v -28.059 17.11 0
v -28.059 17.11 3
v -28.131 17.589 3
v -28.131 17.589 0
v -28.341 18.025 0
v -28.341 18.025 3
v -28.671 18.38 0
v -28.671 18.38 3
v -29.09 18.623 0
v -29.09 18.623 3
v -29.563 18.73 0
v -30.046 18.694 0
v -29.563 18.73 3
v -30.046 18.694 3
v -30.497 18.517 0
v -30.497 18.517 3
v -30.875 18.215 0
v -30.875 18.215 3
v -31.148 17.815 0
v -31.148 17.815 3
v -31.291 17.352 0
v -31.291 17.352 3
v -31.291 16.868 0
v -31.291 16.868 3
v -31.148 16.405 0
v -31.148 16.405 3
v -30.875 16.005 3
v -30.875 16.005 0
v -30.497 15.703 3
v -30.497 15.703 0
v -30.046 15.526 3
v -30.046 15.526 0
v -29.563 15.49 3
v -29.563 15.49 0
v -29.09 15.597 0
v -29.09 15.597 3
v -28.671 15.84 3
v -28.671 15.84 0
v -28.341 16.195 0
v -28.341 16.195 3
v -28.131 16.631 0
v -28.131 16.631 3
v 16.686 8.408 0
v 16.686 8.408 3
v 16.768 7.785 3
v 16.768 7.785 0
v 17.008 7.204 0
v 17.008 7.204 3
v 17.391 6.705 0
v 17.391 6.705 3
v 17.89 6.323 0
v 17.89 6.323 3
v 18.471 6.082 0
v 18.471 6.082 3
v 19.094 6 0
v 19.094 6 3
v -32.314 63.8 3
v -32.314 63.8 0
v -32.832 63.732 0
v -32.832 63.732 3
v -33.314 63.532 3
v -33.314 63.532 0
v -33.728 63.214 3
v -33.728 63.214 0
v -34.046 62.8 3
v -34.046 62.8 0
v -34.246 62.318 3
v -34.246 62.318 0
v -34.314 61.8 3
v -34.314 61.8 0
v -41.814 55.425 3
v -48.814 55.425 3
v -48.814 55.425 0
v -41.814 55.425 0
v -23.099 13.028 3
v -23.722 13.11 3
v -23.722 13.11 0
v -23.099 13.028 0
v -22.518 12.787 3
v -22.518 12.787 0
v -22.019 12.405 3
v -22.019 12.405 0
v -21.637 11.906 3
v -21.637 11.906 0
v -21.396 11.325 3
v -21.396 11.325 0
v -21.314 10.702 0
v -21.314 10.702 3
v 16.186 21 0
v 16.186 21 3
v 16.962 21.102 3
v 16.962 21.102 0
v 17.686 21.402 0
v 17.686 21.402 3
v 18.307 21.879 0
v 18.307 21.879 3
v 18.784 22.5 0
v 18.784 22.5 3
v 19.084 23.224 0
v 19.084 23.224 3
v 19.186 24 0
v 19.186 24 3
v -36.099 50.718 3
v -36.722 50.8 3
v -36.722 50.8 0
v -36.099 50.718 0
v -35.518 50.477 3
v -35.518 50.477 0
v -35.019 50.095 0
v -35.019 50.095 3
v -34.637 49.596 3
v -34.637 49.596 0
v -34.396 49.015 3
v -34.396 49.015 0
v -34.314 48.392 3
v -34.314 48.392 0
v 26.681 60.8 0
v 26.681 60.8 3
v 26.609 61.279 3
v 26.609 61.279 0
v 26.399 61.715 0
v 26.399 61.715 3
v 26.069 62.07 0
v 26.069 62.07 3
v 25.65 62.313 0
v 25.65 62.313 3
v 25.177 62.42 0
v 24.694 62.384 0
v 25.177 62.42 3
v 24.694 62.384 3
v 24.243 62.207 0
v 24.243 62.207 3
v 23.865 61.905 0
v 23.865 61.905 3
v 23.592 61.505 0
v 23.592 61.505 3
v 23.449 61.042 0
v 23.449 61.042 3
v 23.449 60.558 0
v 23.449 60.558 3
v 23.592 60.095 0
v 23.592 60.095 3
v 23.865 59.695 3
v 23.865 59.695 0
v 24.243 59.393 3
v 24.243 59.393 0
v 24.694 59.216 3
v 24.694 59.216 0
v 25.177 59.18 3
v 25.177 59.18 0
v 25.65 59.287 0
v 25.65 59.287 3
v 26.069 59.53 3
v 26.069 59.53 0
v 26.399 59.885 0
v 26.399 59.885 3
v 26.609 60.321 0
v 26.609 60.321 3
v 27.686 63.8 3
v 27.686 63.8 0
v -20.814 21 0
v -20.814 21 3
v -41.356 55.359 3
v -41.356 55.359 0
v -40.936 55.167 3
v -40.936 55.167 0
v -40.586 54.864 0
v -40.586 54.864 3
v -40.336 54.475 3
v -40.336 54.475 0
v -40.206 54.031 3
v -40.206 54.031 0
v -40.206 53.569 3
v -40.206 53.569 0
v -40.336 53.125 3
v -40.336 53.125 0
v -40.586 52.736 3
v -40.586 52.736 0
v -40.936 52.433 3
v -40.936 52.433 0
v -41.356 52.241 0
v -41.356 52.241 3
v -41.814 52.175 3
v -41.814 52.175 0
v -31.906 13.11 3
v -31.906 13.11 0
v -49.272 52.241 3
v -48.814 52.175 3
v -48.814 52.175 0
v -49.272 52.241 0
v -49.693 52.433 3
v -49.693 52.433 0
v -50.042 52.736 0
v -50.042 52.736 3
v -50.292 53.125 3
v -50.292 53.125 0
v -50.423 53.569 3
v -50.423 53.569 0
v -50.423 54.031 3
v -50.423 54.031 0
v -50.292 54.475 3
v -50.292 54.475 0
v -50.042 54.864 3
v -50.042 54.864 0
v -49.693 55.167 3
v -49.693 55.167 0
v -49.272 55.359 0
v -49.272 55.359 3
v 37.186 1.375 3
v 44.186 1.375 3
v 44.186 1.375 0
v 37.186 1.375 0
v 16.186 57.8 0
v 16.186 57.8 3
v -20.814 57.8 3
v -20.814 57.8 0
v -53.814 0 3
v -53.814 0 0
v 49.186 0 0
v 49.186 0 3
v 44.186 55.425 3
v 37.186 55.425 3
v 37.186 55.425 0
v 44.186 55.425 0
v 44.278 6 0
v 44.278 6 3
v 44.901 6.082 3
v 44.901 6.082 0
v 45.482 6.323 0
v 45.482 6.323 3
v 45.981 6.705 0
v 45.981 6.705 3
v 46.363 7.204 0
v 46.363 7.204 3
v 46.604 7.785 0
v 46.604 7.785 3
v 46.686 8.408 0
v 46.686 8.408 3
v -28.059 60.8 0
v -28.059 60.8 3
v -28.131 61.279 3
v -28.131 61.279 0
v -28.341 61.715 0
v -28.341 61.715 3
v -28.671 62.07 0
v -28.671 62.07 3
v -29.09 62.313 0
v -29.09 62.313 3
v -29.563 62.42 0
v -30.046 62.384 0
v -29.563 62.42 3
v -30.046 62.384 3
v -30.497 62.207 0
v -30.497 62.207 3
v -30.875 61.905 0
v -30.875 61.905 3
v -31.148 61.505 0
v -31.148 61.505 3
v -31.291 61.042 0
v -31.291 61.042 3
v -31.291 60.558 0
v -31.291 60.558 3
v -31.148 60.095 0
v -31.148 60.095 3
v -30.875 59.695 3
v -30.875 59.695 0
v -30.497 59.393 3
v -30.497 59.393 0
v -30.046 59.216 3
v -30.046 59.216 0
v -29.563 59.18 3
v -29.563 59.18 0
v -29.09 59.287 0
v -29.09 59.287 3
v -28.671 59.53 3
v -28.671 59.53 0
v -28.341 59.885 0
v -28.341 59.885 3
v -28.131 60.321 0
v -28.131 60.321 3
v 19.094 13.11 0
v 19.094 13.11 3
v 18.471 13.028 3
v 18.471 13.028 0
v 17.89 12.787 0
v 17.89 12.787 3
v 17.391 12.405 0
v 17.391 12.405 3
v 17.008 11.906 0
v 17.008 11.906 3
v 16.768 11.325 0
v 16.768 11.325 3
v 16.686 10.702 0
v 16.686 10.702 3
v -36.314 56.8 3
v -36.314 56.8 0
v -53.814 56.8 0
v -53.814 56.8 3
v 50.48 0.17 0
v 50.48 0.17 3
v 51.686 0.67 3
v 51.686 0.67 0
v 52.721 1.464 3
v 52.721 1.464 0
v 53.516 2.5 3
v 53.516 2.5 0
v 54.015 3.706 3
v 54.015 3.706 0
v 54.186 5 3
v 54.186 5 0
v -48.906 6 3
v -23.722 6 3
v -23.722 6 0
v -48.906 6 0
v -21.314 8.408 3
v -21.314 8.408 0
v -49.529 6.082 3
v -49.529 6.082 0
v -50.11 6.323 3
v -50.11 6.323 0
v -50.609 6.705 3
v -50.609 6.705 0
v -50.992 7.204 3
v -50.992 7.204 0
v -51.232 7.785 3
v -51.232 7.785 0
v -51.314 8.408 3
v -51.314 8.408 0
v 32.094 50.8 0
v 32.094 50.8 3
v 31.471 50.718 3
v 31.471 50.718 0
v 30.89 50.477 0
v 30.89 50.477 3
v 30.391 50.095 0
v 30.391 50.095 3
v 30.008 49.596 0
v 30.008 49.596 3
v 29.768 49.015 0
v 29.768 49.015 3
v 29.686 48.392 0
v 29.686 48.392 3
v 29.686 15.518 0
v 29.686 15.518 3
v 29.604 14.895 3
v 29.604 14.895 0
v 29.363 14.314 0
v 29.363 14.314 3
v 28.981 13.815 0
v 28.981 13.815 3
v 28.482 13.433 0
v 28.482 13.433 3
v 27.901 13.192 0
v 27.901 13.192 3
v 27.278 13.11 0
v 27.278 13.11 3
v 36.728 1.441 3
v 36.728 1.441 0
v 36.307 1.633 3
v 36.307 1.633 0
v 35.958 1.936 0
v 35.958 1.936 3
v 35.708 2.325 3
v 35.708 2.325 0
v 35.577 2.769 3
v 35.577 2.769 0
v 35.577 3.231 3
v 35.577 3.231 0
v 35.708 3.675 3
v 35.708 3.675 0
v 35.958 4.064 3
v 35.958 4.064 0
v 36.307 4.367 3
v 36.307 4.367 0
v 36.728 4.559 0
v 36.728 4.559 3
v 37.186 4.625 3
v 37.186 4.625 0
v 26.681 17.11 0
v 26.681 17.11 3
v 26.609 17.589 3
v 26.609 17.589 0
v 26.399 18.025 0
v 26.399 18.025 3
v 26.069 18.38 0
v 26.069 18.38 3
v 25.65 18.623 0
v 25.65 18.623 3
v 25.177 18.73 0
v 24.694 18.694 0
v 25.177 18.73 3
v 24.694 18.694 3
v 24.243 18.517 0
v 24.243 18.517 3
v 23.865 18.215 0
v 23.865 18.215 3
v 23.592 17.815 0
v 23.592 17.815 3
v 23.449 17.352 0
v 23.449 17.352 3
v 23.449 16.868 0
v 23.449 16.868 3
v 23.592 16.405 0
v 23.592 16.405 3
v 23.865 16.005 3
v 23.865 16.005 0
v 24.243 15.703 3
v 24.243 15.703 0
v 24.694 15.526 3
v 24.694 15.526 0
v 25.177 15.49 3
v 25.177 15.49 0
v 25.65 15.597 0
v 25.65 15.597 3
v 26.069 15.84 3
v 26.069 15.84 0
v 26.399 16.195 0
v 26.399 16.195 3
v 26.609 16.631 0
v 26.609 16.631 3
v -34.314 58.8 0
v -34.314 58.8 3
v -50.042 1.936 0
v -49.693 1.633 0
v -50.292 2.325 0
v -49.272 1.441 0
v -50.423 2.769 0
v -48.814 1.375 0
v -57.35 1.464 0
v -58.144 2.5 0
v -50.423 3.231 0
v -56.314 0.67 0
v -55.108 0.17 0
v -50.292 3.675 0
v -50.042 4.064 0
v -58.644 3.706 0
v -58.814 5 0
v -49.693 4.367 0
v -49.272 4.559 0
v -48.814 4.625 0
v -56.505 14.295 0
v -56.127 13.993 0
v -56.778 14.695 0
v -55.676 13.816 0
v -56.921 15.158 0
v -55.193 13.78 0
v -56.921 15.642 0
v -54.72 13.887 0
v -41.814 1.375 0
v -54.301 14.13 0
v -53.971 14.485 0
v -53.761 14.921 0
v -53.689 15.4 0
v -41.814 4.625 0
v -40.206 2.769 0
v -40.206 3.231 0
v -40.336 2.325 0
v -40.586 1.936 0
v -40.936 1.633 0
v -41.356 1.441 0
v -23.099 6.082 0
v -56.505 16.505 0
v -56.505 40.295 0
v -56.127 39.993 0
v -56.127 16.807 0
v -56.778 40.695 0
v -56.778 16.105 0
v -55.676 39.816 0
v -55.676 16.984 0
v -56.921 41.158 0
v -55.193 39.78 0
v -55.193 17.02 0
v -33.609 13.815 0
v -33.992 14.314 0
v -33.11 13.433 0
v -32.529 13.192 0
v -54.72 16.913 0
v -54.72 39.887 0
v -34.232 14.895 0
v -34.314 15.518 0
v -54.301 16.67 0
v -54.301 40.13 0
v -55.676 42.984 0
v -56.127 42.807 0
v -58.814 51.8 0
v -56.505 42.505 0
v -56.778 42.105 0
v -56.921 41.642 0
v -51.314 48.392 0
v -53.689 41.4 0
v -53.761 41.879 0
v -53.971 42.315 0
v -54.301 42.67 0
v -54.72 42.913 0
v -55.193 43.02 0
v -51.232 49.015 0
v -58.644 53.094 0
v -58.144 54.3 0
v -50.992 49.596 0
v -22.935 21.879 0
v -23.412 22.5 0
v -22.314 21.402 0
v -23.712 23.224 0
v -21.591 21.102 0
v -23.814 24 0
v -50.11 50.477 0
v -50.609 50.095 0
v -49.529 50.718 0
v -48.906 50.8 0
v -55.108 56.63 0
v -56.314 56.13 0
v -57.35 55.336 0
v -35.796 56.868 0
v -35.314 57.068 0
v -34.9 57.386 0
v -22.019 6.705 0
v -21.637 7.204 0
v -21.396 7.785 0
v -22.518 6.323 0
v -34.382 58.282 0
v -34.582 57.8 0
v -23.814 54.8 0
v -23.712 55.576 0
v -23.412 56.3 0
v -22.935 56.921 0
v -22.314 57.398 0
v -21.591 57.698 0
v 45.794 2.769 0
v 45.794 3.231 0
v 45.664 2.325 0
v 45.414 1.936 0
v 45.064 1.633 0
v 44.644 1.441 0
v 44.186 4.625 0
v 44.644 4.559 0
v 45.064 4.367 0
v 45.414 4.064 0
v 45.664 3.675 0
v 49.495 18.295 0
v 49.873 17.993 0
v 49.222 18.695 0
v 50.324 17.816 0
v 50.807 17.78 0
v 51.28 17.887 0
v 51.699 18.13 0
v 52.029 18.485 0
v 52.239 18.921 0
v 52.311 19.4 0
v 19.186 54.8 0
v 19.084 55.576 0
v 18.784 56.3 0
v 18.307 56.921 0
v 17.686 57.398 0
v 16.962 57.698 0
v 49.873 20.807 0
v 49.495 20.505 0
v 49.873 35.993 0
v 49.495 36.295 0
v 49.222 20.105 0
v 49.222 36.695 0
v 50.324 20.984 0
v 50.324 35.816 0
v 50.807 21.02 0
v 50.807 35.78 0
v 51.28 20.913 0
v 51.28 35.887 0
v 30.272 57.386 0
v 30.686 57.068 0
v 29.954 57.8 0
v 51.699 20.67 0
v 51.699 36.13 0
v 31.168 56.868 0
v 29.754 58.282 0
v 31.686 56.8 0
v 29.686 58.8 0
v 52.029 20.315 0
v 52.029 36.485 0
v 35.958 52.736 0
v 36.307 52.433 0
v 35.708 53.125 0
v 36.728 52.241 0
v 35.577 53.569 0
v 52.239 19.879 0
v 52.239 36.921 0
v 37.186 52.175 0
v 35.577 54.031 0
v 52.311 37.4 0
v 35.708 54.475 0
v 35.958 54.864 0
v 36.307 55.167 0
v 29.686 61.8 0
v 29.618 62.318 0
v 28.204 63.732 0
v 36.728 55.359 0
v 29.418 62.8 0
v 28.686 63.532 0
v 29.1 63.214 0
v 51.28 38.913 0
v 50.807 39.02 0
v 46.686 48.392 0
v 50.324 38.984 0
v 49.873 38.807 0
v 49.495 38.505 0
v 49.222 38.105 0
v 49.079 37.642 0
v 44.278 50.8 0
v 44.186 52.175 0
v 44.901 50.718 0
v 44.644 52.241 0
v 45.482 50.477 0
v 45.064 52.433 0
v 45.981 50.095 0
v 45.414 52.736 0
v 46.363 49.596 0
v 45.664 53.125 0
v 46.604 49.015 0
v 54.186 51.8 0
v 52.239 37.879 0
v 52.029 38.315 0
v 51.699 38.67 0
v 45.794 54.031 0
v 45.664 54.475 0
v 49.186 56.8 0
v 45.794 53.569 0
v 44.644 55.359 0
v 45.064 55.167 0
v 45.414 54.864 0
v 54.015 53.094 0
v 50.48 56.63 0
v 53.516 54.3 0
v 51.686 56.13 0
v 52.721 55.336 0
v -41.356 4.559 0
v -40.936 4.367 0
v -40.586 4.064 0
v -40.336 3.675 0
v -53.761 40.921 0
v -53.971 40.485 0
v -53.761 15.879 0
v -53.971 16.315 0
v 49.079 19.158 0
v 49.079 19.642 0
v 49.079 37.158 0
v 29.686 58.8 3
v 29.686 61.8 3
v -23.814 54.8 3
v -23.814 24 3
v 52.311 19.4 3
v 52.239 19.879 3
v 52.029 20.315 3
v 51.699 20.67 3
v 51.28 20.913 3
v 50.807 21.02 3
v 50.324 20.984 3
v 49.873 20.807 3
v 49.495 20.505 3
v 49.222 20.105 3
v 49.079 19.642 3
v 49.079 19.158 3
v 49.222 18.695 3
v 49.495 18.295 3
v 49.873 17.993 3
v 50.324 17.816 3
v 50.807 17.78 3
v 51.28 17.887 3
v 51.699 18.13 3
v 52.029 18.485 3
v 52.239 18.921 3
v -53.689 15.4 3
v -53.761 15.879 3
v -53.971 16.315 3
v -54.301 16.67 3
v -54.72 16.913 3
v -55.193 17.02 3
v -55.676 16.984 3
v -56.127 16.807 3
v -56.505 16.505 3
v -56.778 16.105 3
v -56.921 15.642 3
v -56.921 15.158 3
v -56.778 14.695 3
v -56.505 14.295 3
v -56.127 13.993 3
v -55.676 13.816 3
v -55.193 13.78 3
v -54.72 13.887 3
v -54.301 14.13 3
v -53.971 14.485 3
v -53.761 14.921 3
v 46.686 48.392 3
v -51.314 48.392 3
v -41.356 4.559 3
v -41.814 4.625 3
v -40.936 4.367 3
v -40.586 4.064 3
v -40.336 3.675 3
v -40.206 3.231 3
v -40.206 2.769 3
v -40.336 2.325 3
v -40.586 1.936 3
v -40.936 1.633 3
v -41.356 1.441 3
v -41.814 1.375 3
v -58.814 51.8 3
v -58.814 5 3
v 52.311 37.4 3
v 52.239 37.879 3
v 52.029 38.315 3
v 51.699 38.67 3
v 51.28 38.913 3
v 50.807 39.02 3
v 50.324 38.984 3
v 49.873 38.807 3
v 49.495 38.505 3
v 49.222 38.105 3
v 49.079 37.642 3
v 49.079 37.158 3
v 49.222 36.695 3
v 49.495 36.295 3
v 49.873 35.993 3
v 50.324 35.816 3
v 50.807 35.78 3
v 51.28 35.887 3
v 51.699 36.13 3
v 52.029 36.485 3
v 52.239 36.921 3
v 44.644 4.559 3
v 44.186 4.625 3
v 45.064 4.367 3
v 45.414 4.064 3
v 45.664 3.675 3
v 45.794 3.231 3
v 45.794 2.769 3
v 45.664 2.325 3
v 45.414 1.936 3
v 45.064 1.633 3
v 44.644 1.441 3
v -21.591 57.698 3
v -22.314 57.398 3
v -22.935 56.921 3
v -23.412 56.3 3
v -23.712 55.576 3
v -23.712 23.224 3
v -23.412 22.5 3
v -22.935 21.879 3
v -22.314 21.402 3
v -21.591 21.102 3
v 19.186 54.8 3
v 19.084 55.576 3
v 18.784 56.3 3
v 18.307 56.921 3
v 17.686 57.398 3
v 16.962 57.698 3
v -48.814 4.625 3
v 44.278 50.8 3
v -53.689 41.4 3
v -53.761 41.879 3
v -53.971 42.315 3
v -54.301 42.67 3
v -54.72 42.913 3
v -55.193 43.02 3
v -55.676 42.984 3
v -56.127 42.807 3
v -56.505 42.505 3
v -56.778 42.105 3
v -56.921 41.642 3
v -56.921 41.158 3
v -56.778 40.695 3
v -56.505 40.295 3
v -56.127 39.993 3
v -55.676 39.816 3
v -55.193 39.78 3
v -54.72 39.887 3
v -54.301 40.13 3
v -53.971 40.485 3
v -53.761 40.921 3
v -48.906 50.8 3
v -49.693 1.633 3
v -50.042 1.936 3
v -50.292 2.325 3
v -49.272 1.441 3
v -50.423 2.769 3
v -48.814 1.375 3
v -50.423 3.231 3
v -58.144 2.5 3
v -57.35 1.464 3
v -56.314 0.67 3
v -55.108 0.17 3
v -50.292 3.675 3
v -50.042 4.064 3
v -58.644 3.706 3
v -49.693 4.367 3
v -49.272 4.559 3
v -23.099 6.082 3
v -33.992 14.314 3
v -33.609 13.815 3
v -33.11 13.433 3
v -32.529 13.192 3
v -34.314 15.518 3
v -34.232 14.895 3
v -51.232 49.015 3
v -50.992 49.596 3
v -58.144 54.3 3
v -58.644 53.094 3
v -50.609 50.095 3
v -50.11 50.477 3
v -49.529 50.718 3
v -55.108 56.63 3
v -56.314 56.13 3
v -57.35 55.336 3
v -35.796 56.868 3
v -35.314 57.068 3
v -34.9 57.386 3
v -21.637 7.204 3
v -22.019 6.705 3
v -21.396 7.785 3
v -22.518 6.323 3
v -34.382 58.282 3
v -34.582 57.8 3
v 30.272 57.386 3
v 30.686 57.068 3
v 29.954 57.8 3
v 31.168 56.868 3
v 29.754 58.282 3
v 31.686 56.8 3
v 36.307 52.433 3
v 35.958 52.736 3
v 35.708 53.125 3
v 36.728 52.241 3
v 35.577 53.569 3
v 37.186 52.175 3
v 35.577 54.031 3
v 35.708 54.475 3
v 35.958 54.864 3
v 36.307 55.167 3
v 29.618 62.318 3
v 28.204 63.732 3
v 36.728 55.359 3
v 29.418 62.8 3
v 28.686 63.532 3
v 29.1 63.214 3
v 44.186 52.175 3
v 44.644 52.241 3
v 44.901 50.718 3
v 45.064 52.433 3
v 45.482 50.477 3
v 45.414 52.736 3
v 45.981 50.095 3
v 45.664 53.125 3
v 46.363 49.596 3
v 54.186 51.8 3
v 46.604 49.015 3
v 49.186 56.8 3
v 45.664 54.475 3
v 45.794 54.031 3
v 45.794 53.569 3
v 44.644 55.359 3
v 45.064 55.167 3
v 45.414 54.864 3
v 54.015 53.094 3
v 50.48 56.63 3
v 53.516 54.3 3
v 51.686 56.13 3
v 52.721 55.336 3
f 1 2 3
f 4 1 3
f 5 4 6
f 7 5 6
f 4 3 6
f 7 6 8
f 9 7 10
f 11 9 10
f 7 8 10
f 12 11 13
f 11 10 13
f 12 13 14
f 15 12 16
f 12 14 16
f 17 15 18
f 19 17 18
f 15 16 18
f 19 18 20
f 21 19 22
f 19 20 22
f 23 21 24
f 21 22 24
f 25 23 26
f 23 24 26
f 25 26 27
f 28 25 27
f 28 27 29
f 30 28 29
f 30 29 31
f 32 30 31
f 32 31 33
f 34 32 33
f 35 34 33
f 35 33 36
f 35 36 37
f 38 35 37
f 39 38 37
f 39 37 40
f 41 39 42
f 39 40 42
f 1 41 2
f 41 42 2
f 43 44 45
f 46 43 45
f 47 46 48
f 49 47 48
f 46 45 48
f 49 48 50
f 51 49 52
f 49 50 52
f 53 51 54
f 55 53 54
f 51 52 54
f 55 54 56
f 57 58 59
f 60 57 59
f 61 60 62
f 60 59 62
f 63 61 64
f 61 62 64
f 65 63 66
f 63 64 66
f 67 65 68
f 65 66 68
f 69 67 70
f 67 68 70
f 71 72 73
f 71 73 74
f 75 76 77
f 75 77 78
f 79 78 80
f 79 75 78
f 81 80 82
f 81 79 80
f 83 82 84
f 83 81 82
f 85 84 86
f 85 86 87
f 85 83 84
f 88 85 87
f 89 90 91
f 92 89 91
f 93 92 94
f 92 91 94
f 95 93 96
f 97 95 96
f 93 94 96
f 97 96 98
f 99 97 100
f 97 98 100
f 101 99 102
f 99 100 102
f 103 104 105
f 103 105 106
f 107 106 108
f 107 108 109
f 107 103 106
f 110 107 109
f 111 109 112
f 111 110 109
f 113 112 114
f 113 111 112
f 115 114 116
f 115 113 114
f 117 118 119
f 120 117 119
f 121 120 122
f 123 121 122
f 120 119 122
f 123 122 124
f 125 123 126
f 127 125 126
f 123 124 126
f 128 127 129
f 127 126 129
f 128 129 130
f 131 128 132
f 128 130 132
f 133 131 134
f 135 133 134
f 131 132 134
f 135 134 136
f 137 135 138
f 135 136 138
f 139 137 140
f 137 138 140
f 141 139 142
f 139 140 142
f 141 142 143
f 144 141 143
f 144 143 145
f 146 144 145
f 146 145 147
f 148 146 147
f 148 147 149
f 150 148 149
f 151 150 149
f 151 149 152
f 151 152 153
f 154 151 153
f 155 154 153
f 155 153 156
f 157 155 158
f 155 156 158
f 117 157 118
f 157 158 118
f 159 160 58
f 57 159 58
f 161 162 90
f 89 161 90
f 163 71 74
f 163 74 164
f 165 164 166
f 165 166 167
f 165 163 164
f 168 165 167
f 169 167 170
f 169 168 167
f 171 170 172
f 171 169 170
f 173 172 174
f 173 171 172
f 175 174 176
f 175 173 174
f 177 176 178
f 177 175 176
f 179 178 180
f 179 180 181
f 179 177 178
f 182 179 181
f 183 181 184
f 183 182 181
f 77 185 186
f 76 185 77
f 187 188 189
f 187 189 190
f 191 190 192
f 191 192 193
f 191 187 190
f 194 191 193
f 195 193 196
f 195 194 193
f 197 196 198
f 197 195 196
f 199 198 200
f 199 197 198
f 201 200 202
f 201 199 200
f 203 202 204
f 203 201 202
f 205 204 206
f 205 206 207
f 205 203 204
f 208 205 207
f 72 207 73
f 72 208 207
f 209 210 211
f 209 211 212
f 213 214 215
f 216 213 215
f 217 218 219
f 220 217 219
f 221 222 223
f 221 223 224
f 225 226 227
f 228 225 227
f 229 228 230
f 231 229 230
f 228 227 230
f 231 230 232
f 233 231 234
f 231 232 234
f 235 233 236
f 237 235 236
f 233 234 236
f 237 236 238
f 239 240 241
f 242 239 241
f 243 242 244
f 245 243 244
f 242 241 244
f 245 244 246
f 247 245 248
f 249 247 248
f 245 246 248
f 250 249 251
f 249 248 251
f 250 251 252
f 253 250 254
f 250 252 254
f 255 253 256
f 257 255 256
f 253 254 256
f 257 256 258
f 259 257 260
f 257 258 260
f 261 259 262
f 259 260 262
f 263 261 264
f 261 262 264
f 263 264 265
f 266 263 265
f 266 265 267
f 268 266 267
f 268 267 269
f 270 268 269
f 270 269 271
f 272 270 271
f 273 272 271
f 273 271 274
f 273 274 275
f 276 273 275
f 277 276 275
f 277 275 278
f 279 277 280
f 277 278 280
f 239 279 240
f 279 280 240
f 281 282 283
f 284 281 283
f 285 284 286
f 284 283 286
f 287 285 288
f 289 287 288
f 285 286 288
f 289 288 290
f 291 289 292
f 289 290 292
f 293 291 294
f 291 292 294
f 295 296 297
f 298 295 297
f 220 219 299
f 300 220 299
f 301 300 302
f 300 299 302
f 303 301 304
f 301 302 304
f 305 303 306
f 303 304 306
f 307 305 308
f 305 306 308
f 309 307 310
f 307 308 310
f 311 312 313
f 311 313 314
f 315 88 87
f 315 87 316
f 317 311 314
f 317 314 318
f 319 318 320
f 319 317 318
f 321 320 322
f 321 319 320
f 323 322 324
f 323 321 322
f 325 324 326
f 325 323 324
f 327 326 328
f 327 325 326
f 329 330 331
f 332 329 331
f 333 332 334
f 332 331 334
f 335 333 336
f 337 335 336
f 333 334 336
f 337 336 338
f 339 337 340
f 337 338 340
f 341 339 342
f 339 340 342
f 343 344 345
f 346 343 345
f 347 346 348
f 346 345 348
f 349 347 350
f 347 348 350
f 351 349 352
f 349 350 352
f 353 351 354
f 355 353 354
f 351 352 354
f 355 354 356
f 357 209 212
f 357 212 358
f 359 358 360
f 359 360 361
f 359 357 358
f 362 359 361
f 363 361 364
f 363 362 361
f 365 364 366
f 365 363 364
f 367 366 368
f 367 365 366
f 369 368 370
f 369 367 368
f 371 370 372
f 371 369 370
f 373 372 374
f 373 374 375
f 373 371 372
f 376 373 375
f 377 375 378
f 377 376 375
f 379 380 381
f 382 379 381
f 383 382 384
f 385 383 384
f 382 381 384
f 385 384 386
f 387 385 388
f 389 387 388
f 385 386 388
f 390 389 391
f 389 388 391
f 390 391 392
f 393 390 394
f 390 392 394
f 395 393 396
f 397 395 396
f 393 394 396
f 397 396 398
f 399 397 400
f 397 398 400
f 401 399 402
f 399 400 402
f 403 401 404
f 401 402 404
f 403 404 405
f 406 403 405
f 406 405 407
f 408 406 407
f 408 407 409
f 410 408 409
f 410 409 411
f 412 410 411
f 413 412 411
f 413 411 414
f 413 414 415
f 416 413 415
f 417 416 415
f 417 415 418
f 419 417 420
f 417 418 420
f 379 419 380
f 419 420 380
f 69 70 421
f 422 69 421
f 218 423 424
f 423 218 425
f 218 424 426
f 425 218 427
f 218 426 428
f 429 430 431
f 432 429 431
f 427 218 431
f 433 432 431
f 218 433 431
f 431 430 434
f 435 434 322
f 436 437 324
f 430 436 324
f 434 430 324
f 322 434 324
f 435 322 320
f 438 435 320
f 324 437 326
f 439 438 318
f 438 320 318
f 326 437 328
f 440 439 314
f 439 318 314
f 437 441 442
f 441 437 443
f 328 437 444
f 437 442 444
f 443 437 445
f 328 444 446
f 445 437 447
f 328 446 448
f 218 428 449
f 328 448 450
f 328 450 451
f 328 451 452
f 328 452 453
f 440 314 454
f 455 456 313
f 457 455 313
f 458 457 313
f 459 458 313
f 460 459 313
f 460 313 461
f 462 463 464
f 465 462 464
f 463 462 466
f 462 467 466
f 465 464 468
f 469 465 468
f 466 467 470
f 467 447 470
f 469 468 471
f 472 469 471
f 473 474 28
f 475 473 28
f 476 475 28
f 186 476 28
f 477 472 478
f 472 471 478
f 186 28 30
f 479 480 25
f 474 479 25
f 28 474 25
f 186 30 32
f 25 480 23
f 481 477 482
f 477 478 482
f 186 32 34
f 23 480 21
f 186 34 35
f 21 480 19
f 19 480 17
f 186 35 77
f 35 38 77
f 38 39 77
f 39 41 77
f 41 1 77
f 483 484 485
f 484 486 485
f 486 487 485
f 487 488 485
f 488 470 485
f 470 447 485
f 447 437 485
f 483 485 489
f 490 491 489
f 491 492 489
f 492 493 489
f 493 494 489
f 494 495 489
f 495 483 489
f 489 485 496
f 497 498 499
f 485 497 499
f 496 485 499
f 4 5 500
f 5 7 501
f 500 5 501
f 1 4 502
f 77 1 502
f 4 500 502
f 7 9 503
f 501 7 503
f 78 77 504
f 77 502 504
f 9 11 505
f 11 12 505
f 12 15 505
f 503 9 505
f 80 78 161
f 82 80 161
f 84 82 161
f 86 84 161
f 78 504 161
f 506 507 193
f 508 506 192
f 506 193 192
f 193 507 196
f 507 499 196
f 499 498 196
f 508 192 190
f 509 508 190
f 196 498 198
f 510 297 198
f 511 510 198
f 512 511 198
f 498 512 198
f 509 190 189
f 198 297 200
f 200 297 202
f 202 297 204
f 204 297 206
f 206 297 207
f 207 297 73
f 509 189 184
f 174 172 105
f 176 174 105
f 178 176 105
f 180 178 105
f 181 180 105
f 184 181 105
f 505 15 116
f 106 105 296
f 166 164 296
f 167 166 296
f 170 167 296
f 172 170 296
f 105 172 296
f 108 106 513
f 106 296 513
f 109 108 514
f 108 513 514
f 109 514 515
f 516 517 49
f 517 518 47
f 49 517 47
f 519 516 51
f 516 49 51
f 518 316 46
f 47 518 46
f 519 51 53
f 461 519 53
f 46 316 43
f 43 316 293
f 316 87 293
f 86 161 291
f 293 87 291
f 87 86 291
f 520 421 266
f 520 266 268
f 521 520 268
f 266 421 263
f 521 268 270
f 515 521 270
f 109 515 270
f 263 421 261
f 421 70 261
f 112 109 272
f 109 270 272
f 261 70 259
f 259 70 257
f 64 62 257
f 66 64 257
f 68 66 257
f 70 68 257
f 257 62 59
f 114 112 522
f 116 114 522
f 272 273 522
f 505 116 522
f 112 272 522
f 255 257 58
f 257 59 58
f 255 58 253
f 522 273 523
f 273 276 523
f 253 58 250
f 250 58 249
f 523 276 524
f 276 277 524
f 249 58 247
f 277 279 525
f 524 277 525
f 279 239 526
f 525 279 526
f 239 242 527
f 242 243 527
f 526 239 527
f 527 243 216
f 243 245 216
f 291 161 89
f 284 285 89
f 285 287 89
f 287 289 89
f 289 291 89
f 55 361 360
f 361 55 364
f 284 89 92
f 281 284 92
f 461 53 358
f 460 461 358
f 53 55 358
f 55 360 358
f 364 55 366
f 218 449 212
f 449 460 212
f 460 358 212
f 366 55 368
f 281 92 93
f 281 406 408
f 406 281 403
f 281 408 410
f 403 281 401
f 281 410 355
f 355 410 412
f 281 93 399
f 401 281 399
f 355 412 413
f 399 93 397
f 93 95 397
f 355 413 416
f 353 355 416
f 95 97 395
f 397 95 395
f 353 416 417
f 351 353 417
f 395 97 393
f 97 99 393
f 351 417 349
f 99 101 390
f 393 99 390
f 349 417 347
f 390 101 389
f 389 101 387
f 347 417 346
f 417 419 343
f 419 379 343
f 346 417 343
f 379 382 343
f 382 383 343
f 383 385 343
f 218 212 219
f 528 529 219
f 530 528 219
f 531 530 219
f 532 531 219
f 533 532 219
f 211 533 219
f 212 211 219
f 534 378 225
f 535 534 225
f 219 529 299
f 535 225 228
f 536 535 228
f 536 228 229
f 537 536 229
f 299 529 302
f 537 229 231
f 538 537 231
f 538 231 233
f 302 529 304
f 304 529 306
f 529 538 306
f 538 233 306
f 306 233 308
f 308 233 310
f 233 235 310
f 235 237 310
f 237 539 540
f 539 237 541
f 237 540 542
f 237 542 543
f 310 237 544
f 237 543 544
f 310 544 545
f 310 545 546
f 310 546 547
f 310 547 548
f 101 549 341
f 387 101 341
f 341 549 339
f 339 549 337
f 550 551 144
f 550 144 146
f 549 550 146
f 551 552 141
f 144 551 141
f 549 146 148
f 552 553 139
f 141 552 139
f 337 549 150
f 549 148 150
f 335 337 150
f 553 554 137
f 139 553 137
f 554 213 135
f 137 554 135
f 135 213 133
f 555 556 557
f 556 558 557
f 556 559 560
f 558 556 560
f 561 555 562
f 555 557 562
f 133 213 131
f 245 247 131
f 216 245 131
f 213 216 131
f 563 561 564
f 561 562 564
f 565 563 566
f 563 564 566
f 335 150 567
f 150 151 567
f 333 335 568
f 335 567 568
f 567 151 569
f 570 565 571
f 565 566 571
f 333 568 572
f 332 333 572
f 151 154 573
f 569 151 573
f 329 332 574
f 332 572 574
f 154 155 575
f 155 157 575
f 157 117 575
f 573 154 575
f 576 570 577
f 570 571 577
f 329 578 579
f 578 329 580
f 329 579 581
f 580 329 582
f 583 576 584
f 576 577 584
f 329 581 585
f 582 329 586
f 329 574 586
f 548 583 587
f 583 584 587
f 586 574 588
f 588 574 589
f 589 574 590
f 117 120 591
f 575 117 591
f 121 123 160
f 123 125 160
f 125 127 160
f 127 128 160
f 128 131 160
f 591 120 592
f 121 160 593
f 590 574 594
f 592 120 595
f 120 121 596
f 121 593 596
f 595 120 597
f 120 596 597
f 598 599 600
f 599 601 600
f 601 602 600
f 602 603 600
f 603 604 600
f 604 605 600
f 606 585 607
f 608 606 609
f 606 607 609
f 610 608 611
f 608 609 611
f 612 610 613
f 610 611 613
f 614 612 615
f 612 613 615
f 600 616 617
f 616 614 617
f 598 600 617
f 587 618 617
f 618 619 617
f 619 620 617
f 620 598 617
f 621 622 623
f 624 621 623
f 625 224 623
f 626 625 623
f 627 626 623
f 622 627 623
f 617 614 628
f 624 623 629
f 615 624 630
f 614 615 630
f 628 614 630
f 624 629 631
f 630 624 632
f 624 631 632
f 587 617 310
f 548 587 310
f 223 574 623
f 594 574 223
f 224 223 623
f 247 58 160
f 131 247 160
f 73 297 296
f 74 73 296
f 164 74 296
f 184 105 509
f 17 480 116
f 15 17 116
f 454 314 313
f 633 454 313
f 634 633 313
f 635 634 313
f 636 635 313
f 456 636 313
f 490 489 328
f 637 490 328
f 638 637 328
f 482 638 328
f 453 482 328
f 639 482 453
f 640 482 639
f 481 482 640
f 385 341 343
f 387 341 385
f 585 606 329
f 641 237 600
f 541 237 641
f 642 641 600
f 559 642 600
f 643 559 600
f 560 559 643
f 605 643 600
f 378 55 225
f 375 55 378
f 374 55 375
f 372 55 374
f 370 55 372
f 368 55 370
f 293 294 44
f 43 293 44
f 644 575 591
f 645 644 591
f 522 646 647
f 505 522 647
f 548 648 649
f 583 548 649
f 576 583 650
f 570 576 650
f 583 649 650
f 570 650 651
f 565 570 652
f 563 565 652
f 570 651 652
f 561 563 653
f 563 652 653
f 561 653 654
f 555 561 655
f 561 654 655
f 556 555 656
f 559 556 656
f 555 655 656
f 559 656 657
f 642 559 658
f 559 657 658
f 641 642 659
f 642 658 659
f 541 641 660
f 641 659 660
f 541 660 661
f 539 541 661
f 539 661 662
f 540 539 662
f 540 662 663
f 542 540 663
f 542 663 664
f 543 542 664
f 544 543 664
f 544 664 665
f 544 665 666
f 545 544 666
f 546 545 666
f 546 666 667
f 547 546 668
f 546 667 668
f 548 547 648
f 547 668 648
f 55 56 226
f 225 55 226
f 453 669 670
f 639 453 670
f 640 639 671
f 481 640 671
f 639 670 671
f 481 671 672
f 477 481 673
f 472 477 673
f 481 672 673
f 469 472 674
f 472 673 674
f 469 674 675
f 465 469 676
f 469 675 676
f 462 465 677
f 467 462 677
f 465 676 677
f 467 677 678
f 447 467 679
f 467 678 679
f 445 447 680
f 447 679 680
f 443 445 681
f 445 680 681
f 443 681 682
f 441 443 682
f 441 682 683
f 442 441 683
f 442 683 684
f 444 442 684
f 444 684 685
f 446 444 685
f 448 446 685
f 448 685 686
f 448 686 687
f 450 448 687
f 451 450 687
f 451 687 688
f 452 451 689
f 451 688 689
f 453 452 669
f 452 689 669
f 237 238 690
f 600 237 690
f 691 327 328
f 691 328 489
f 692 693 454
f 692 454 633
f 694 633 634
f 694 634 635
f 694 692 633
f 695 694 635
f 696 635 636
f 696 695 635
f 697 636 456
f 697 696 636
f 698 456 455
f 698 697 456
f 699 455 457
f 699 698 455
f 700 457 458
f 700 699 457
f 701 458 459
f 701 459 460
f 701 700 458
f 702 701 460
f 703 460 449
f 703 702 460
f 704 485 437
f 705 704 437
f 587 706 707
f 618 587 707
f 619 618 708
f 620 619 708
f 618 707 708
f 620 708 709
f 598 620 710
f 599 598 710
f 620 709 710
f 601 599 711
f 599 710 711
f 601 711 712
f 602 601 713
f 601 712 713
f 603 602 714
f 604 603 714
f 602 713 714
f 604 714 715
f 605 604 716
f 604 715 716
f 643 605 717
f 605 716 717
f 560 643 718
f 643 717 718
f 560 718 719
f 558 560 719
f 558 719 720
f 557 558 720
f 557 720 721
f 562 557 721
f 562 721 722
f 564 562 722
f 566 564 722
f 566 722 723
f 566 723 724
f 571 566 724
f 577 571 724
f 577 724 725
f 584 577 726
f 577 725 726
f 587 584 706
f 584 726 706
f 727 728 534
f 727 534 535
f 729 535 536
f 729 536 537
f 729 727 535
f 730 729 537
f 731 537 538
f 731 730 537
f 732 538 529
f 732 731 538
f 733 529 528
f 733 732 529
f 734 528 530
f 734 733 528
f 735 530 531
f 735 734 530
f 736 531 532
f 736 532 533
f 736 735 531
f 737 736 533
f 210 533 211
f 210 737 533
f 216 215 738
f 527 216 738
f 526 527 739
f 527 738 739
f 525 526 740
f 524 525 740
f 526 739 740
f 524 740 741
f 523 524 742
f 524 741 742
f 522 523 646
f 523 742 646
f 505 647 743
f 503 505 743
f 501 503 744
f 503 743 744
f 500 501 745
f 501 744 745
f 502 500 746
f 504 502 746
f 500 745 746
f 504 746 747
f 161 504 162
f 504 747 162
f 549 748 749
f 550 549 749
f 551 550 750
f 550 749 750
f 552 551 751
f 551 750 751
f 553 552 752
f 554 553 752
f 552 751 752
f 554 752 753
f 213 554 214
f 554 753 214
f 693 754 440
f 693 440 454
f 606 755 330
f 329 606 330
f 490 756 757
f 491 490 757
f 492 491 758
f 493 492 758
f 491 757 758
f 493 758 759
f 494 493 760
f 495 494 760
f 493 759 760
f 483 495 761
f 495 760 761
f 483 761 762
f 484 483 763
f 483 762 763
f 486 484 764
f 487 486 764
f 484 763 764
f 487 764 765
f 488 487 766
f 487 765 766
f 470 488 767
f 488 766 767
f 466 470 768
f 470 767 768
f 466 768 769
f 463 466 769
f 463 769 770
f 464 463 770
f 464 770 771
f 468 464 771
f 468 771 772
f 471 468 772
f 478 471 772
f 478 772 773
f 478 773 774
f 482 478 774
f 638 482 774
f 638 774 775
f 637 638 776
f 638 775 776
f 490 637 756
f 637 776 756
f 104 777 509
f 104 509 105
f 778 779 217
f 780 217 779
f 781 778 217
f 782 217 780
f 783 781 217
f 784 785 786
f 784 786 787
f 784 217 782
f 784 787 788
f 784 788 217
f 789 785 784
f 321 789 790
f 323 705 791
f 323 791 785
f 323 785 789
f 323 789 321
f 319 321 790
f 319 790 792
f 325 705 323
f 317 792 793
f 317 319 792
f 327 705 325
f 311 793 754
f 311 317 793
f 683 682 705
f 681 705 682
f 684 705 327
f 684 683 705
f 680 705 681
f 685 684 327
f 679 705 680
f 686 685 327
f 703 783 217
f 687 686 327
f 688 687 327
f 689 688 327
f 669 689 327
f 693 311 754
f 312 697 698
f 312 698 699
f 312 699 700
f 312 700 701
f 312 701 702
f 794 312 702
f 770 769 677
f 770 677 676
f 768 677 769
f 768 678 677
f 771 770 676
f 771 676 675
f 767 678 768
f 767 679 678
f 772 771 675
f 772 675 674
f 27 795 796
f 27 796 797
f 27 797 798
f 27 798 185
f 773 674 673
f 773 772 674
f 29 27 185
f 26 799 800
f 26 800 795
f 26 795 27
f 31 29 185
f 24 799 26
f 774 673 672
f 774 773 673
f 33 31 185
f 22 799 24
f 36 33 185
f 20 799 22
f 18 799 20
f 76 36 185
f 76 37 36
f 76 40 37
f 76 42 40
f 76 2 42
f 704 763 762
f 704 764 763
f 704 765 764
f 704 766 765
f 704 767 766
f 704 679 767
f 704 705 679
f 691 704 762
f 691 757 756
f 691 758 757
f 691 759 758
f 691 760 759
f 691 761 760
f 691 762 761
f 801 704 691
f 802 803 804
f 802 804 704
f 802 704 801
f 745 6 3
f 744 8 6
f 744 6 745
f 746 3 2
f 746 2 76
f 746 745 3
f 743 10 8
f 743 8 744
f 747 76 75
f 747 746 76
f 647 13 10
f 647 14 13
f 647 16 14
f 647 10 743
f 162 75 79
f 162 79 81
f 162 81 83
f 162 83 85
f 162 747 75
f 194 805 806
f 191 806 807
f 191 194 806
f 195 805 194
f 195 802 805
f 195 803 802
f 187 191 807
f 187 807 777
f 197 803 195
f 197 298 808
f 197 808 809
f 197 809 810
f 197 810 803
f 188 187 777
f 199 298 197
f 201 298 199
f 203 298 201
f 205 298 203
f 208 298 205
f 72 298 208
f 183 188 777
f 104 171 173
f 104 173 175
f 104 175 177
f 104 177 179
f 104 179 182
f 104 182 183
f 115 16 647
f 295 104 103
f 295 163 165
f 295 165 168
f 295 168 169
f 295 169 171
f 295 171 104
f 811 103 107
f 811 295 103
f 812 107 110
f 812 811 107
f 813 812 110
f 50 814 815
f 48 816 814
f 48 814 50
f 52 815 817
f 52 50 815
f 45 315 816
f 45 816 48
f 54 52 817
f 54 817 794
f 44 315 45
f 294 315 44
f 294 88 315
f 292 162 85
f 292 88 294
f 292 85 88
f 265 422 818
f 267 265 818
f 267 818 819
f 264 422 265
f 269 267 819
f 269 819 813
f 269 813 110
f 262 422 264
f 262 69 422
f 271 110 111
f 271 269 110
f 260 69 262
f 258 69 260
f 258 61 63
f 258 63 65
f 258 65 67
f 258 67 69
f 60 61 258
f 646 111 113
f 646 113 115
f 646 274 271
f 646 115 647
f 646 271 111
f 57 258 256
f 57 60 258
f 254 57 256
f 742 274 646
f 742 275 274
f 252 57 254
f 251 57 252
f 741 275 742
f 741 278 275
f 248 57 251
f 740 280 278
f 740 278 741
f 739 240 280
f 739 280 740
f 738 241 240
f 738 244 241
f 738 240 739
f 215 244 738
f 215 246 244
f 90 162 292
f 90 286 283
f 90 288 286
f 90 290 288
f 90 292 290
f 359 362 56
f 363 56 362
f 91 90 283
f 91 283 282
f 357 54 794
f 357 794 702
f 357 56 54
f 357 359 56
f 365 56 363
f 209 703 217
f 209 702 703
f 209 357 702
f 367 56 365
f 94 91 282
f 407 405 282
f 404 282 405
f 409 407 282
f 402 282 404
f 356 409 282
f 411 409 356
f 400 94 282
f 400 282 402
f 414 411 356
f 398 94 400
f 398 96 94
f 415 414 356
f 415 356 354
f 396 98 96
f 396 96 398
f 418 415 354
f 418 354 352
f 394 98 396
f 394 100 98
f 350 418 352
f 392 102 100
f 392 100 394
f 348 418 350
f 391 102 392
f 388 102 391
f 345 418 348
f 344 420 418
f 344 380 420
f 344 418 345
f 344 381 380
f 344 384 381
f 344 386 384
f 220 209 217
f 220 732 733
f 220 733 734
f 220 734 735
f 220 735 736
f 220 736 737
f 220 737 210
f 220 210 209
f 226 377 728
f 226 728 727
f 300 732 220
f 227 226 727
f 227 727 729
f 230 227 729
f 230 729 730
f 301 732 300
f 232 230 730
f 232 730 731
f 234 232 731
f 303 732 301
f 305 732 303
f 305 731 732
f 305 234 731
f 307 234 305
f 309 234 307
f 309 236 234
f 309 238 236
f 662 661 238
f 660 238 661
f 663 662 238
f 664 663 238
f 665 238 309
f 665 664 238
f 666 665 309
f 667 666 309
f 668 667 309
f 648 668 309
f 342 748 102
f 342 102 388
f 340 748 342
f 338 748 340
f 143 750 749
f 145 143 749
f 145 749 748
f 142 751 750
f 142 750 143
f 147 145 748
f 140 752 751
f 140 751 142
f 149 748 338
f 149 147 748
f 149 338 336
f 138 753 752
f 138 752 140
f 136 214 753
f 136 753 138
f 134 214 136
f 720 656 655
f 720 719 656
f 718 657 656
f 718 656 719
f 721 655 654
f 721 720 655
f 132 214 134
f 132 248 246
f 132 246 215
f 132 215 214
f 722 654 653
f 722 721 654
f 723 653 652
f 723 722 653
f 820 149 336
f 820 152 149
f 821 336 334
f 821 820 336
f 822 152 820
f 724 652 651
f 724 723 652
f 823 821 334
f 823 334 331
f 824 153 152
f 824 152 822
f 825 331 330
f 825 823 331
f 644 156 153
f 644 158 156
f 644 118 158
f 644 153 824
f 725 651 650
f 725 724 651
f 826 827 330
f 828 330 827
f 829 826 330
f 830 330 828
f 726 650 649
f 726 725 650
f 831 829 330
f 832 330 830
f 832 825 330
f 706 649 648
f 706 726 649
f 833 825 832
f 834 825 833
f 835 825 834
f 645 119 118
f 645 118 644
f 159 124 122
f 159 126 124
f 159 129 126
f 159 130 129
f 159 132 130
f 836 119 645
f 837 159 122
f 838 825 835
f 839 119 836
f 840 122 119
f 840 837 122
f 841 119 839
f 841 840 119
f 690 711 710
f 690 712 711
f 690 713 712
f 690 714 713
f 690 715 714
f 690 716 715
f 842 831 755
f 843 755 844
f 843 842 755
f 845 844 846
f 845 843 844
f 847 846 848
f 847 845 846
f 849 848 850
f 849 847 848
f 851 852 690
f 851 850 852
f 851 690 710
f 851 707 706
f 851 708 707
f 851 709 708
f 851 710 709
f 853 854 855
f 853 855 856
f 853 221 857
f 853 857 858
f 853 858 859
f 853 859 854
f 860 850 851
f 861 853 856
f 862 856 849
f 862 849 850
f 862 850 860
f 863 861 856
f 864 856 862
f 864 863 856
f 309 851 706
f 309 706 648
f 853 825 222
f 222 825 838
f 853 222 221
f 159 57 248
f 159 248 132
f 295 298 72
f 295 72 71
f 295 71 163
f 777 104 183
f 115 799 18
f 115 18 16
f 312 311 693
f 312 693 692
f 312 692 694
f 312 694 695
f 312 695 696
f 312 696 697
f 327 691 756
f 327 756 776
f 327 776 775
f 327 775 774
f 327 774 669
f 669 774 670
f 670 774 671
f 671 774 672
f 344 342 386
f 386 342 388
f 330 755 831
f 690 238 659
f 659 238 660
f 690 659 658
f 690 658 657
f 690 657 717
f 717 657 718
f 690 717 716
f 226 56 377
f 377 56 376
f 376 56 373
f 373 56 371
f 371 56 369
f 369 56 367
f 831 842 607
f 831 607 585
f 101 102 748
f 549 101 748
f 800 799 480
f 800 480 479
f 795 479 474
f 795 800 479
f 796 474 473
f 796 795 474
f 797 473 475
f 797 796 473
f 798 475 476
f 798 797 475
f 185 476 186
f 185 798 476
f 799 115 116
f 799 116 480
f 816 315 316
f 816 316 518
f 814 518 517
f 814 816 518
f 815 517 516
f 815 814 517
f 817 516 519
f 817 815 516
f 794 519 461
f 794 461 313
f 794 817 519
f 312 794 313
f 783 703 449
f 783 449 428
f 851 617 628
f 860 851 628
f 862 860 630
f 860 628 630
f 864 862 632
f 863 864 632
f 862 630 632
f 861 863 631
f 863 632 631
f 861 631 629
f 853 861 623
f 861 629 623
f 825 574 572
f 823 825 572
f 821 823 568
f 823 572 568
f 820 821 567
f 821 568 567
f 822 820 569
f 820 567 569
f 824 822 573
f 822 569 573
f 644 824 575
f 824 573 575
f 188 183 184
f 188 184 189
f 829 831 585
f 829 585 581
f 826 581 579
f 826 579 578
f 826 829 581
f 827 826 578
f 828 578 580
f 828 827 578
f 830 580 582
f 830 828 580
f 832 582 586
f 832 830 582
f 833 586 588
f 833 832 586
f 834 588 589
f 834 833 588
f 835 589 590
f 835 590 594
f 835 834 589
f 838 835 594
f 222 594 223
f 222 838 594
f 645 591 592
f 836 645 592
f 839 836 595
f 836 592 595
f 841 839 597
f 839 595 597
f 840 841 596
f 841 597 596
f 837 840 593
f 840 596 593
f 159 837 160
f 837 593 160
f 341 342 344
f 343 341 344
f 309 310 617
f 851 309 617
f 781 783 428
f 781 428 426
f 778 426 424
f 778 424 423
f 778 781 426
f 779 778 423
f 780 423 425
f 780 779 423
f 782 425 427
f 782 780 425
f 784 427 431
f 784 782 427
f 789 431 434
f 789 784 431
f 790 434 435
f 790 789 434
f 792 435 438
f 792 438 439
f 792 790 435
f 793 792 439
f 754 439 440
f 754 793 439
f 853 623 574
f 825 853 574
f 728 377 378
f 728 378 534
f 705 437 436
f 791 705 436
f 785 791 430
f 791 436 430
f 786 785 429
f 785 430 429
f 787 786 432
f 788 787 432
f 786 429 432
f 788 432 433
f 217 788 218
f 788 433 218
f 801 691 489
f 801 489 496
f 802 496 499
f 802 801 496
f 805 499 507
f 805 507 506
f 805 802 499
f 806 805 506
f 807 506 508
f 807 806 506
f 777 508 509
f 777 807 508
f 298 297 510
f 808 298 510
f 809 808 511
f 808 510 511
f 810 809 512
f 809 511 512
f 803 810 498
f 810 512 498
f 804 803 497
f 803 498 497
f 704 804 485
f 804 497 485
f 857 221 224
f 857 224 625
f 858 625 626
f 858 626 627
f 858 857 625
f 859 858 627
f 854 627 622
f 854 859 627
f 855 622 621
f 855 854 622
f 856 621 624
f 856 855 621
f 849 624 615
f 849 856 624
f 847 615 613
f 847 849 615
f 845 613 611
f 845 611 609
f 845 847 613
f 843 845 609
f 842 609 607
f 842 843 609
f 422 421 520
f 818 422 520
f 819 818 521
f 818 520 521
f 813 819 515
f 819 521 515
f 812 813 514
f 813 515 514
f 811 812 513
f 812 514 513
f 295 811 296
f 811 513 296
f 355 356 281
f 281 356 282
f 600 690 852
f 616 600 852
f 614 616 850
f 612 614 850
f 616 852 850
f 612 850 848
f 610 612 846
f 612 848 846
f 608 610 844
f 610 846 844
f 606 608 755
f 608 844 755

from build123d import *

# Parameters (mm, degrees)
EXTRUDE_2_DEPTH     = 3
SKETCH_5_R          = 1.625
CUT_EXTRUDE_3_DEPTH = 3


with BuildPart() as part:
    # 草图1 → 凸台-拉伸2 (new body)
    with BuildSketch(Plane.XY):
        with BuildLine():
            Line((-53.814137931, 0), (49.185862069, 0))
            ThreePointArc((49.185862069, 0), (52.721395975, 1.464466094), (54.185862069, 5))
            Line((54.185862069, 5), (54.185862069, 51.8))
            ThreePointArc((54.185862069, 51.8), (52.721395975, 55.335533906), (49.185862069, 56.8))
            Line((49.185862069, 56.8), (31.685862069, 56.8))
            ThreePointArc((31.685862069, 56.8), (30.271648507, 57.385786438), (29.685862069, 58.8))
            Line((29.685862069, 58.8), (29.685862069, 61.8))
            ThreePointArc((29.685862069, 61.8), (29.100075631, 63.214213562), (27.685862069, 63.8))
            Line((27.685862069, 63.8), (-32.314137931, 63.8))
            ThreePointArc((-32.314137931, 63.8), (-33.728351493, 63.214213562), (-34.314137931, 61.8))
            Line((-34.314137931, 61.8), (-34.314137931, 58.8))
            ThreePointArc((-34.314137931, 58.8), (-34.899924369, 57.385786438), (-36.314137931, 56.8))
            Line((-36.314137931, 56.8), (-53.814137931, 56.8))
            ThreePointArc((-53.814137931, 56.8), (-57.349671837, 55.335533906), (-58.814137931, 51.8))
            Line((-58.814137931, 51.8), (-58.814137931, 5))
            ThreePointArc((-58.814137931, 5), (-57.349671837, 1.464466094), (-53.814137931, 0))
        make_face()
    extrude(amount=EXTRUDE_2_DEPTH)

    # 草图5 → 切除-拉伸3 (cut)
    with BuildSketch(Plane.XY.offset(3)):
        with Locations((-29.684137931, 60.8)):
            Circle(SKETCH_5_R)
        with Locations((25.055862069, 60.8)):
            Circle(SKETCH_5_R)
        with Locations((-29.684137931, 17.11)):
            Circle(SKETCH_5_R)
        with Locations((25.055862069, 17.11)):
            Circle(SKETCH_5_R)
        with Locations((-55.314137931, 15.4)):
            Circle(SKETCH_5_R)
        with Locations((-55.314137931, 41.4)):
            Circle(SKETCH_5_R)
        with Locations((50.685862069, 37.4)):
            Circle(SKETCH_5_R)
        with Locations((50.685862069, 19.4)):
            Circle(SKETCH_5_R)
        with BuildLine():
            Line((-48.906226665, 50.8), (-36.722049198, 50.8))
            ThreePointArc((-36.722049198, 50.8), (-35.019398812, 50.094739119), (-34.314137931, 48.392088734))
            Line((-34.314137931, 48.392088734), (-34.314137931, 15.517911266))
            ThreePointArc((-34.314137931, 15.517911266), (-33.60887705, 13.815260881), (-31.906226665, 13.11))
            Line((-31.906226665, 13.11), (-23.722049198, 13.11))
            ThreePointArc((-23.722049198, 13.11), (-22.019398812, 12.404739119), (-21.314137931, 10.702088734))
            Line((-21.314137931, 10.702088734), (-21.314137931, 8.407911266))
            ThreePointArc((-21.314137931, 8.407911266), (-22.019398812, 6.705260881), (-23.722049198, 6))
            Line((-23.722049198, 6), (-48.906226665, 6))
            ThreePointArc((-48.906226665, 6), (-50.60887705, 6.705260881), (-51.314137931, 8.407911266))
            Line((-51.314137931, 8.407911266), (-51.314137931, 48.392088734))
            ThreePointArc((-51.314137931, 48.392088734), (-50.60887705, 50.094739119), (-48.906226665, 50.8))
        make_face()
        with BuildLine():
            Line((-48.814137931, 4.625), (-41.814137931, 4.625))
            ThreePointArc((-41.814137931, 4.625), (-40.189137931, 3), (-41.814137931, 1.375))
            Line((-41.814137931, 1.375), (-48.814137931, 1.375))
            ThreePointArc((-48.814137931, 1.375), (-50.439137931, 3), (-48.814137931, 4.625))
        make_face()
        with BuildLine():
            Line((37.185862069, 4.625), (44.185862069, 4.625))
            ThreePointArc((44.185862069, 4.625), (45.810862069, 3), (44.185862069, 1.375))
            Line((44.185862069, 1.375), (37.185862069, 1.375))
            ThreePointArc((37.185862069, 1.375), (35.560862069, 3), (37.185862069, 4.625))
        make_face()
        with BuildLine():
            Line((-48.814137931, 55.425), (-41.814137931, 55.425))
            ThreePointArc((-41.814137931, 55.425), (-40.189137931, 53.8), (-41.814137931, 52.175))
            Line((-41.814137931, 52.175), (-48.814137931, 52.175))
            ThreePointArc((-48.814137931, 52.175), (-50.439137931, 53.8), (-48.814137931, 55.425))
        make_face()
        with BuildLine():
            Line((37.185862069, 55.425), (44.185862069, 55.425))
            ThreePointArc((44.185862069, 55.425), (45.810862069, 53.8), (44.185862069, 52.175))
            Line((44.185862069, 52.175), (37.185862069, 52.175))
            ThreePointArc((37.185862069, 52.175), (35.560862069, 53.8), (37.185862069, 55.425))
        make_face()
        with BuildLine():
            Line((29.685862069, 48.392088734), (29.685862069, 15.517911266))
            ThreePointArc((29.685862069, 15.517911266), (28.980601188, 13.815260881), (27.277950802, 13.11))
            Line((27.277950802, 13.11), (19.093773335, 13.11))
            ThreePointArc((19.093773335, 13.11), (17.39112295, 12.404739119), (16.685862069, 10.702088734))
            Line((16.685862069, 10.702088734), (16.685862069, 8.407911266))
            ThreePointArc((16.685862069, 8.407911266), (17.39112295, 6.705260881), (19.093773335, 6))
            Line((19.093773335, 6), (44.277950802, 6))
            ThreePointArc((44.277950802, 6), (45.980601188, 6.705260881), (46.685862069, 8.407911266))
            Line((46.685862069, 8.407911266), (46.685862069, 48.392088734))
            ThreePointArc((46.685862069, 48.392088734), (45.980601188, 50.094739119), (44.277950802, 50.8))
            Line((44.277950802, 50.8), (32.093773335, 50.8))
            ThreePointArc((32.093773335, 50.8), (30.39112295, 50.094739119), (29.685862069, 48.392088734))
        make_face()
        with BuildLine():
            Line((-23.814137931, 54.8), (-23.814137931, 24))
            ThreePointArc((-23.814137931, 24), (-22.935458275, 21.878679656), (-20.814137931, 21))
            Line((-20.814137931, 21), (16.185862069, 21))
            ThreePointArc((16.185862069, 21), (18.307182413, 21.878679656), (19.185862069, 24))
            Line((19.185862069, 24), (19.185862069, 54.8))
            ThreePointArc((19.185862069, 54.8), (18.307182413, 56.921320344), (16.185862069, 57.8))
            Line((16.185862069, 57.8), (-20.814137931, 57.8))
            ThreePointArc((-20.814137931, 57.8), (-22.935458275, 56.921320344), (-23.814137931, 54.8))
        make_face()
    extrude(amount=-CUT_EXTRUDE_3_DEPTH, mode=Mode.SUBTRACT)


solid = part.part
